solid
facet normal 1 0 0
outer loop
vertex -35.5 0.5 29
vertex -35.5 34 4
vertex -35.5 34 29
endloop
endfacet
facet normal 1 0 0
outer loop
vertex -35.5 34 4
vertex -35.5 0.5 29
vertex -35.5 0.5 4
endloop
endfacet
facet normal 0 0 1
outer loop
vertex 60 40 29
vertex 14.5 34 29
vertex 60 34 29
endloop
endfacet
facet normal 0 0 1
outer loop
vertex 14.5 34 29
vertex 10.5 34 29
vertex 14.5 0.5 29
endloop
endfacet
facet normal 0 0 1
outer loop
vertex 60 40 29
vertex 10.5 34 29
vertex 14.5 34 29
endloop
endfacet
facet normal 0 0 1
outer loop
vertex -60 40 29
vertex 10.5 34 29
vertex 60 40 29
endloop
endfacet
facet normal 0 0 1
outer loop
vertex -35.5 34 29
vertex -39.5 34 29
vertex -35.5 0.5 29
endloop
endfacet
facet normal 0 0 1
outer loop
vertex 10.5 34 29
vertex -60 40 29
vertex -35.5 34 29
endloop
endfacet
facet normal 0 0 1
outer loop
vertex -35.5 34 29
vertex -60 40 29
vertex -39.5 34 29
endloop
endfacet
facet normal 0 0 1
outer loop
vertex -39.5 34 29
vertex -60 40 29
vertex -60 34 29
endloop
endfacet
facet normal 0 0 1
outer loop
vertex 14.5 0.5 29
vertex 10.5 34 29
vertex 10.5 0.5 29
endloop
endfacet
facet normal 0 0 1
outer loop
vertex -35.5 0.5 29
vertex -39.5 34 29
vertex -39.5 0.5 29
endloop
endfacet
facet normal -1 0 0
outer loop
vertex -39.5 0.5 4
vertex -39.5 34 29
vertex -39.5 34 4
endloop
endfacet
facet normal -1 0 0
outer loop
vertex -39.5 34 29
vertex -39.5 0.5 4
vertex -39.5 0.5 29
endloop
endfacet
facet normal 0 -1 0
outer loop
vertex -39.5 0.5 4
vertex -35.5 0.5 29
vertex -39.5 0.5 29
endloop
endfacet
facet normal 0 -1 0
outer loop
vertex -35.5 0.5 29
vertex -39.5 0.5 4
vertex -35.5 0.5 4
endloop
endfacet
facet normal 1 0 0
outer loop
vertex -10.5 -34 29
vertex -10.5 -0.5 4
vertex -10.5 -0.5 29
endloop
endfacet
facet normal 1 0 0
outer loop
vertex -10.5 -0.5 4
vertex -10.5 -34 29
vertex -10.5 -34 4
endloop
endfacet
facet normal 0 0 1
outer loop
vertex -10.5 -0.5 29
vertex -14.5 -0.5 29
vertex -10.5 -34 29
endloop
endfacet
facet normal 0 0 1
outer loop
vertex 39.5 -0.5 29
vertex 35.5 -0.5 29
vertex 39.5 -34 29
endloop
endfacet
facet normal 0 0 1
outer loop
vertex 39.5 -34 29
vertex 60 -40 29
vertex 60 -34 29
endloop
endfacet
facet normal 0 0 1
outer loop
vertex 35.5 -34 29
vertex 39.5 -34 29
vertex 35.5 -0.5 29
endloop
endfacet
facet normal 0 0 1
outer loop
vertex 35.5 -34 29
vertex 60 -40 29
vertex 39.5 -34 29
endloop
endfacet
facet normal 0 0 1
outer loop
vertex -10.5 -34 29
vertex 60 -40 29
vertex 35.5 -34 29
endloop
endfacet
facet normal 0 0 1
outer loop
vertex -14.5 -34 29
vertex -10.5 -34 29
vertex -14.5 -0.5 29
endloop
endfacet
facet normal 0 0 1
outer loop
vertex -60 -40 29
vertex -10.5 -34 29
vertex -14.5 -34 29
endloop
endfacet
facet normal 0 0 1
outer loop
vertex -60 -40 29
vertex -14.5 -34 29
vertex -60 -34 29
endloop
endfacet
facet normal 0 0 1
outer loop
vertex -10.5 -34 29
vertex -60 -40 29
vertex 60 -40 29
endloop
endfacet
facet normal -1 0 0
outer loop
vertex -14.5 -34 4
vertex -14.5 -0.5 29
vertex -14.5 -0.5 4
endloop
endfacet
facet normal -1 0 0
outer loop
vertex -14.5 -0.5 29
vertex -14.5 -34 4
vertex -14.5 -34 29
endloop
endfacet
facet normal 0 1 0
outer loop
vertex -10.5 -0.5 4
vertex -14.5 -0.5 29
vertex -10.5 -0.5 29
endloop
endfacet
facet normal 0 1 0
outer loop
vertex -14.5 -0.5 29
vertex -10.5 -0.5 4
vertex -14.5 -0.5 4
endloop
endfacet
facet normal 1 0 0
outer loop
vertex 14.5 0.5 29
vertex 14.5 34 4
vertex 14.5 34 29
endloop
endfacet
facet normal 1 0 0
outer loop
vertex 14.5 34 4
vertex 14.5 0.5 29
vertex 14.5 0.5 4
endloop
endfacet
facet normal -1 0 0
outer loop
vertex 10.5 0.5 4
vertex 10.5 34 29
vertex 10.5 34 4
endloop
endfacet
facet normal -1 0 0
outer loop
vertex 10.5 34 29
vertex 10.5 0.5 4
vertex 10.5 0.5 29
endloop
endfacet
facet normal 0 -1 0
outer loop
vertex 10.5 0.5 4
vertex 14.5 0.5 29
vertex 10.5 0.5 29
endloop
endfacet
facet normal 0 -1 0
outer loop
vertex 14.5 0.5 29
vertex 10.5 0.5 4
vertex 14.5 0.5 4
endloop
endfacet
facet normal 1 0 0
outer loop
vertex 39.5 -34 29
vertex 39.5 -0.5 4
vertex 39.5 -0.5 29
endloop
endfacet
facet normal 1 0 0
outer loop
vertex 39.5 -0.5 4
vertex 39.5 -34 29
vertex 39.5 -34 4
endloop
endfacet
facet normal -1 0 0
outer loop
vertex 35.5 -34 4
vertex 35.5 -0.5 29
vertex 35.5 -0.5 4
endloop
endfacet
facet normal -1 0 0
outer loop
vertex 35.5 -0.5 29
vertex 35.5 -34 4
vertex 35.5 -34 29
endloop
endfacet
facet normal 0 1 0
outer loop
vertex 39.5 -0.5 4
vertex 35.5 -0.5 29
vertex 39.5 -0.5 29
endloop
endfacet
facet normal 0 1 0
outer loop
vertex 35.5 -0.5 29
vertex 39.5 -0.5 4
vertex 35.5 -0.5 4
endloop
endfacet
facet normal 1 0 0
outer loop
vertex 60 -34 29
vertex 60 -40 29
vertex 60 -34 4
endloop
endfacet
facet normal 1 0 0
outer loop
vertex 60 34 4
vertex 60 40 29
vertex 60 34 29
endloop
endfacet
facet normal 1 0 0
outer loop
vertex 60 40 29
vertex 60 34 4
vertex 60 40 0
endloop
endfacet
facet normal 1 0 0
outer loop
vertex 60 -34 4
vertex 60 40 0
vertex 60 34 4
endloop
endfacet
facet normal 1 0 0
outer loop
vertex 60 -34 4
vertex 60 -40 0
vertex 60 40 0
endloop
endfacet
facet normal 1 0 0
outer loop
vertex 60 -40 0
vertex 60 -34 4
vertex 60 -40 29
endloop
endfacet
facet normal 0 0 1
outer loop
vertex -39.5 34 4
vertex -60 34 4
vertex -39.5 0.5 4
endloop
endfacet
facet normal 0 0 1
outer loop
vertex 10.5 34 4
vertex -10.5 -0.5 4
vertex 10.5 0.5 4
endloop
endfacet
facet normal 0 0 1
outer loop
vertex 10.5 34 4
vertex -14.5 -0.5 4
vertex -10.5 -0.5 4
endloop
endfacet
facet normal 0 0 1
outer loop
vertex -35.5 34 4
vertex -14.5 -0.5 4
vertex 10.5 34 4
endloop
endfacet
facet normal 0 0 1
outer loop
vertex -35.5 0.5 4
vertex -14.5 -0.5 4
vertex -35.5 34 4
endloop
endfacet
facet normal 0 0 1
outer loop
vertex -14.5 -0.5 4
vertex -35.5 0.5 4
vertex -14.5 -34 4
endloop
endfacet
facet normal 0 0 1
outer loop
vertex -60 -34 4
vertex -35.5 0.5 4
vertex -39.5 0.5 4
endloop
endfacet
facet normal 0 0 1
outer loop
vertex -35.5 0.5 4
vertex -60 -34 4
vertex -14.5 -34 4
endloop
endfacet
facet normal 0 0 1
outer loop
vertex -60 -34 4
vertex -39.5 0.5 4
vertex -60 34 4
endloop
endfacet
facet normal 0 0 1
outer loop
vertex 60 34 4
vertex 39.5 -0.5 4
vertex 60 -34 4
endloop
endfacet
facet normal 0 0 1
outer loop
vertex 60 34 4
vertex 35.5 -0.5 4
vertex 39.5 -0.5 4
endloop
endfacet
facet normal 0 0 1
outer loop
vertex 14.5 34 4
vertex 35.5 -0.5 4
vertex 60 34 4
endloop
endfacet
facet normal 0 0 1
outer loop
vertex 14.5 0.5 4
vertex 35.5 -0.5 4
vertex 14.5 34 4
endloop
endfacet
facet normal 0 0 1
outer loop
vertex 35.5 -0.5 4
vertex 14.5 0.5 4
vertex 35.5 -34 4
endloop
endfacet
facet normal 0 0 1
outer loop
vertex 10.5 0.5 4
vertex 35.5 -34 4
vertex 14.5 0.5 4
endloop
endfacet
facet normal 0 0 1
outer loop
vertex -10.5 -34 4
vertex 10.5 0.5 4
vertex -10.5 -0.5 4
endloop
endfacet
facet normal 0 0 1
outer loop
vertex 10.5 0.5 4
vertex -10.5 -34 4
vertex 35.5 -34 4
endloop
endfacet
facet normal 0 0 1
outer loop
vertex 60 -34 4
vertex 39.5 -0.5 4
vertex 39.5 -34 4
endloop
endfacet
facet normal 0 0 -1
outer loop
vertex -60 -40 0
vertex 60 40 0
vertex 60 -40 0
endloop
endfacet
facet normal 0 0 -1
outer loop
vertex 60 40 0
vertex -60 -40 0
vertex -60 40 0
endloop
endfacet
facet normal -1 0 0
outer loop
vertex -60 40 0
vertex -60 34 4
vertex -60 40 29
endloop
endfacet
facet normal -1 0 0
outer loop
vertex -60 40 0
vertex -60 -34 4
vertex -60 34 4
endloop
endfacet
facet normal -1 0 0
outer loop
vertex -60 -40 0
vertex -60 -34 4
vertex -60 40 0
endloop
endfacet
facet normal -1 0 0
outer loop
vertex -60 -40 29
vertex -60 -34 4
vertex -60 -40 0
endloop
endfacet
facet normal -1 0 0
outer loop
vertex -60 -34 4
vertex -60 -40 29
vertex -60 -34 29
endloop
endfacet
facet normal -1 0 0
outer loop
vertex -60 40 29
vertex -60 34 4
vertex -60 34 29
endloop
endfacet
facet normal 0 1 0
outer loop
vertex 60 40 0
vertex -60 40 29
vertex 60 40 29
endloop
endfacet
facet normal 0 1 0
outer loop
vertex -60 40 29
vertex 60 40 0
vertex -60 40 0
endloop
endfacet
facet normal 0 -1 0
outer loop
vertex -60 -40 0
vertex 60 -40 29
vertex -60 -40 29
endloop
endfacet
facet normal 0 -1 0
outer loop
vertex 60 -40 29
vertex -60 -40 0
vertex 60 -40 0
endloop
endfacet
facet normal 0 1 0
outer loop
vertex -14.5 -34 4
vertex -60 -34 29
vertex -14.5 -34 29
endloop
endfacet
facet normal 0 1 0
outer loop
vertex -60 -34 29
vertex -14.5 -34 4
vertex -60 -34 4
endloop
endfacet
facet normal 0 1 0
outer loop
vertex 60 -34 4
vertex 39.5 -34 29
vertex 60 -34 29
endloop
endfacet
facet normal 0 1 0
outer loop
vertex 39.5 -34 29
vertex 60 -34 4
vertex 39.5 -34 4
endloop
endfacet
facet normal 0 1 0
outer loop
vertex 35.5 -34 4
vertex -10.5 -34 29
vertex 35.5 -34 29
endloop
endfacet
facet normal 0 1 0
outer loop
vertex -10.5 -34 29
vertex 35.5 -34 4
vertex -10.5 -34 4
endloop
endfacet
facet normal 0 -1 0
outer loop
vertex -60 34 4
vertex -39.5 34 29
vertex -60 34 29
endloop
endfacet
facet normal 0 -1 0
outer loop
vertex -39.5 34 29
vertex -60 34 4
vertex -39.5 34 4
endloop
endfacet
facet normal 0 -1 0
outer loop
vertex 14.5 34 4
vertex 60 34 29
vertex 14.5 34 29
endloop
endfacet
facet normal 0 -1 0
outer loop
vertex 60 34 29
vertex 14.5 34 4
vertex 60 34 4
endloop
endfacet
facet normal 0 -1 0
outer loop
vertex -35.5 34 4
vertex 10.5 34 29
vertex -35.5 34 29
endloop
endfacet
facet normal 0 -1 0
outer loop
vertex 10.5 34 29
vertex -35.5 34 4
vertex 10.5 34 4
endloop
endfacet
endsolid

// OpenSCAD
$fn = 32;

// ----------------------------------------------------------------------
// Rib frame 120 x 80 x 29
// 4 ribs at 25 mm pitch, staggered
// ----------------------------------------------------------------------

// --- parameters (mm) ---
frame = [120, 80, 4];  // base plate size (x, y, z)
rail_w = 6;            // side rail width
ribs = 4;              // number of ribs
rib_t = 4;             // rib thickness
rib_h = 25;            // rib height above the base plate
pitch = 25;            // pitch between rib centres

// --- derived feature positions (mm) ---
span = (ribs - 1) * pitch;          // = 75   distance between the outer ribs
origin_x = -span / 2;               // = -37.5   X of the first rib
rib_len = frame[1] / 2 - rail_w + 0.5;  // = 34.5   length of a staggered rib
rib_y = 0.5 + rib_len / 2;          // = 17.75   Y of a staggered rib centre
row_offset = 2 * rib_y;             // = 35.5   distance between the two rows
feature_centers = [
  [origin_x + 0 * pitch, rib_y],
  [origin_x + 1 * pitch, -rib_y],
  [origin_x + 2 * pitch, rib_y],
  [origin_x + 3 * pitch, -rib_y]
];   // rib centre line, drives the rib loop

// base plate, two side rails, then the ribs read straight off feature_centers
union() {
  translate([-frame[0] / 2, -frame[1] / 2, 0]) cube(frame);
  translate([-frame[0] / 2, -frame[1] / 2, 0]) cube([frame[0], rail_w, frame[2] + rib_h]);
  translate([-frame[0] / 2, frame[1] / 2 - rail_w, 0]) cube([frame[0], rail_w, frame[2] + rib_h]);
  for (centre = feature_centers)
    translate([centre[0] - rib_t / 2, centre[1] - rib_len / 2, frame[2] - 1])
      cube([rib_t, rib_len, rib_h + 1]);
}
